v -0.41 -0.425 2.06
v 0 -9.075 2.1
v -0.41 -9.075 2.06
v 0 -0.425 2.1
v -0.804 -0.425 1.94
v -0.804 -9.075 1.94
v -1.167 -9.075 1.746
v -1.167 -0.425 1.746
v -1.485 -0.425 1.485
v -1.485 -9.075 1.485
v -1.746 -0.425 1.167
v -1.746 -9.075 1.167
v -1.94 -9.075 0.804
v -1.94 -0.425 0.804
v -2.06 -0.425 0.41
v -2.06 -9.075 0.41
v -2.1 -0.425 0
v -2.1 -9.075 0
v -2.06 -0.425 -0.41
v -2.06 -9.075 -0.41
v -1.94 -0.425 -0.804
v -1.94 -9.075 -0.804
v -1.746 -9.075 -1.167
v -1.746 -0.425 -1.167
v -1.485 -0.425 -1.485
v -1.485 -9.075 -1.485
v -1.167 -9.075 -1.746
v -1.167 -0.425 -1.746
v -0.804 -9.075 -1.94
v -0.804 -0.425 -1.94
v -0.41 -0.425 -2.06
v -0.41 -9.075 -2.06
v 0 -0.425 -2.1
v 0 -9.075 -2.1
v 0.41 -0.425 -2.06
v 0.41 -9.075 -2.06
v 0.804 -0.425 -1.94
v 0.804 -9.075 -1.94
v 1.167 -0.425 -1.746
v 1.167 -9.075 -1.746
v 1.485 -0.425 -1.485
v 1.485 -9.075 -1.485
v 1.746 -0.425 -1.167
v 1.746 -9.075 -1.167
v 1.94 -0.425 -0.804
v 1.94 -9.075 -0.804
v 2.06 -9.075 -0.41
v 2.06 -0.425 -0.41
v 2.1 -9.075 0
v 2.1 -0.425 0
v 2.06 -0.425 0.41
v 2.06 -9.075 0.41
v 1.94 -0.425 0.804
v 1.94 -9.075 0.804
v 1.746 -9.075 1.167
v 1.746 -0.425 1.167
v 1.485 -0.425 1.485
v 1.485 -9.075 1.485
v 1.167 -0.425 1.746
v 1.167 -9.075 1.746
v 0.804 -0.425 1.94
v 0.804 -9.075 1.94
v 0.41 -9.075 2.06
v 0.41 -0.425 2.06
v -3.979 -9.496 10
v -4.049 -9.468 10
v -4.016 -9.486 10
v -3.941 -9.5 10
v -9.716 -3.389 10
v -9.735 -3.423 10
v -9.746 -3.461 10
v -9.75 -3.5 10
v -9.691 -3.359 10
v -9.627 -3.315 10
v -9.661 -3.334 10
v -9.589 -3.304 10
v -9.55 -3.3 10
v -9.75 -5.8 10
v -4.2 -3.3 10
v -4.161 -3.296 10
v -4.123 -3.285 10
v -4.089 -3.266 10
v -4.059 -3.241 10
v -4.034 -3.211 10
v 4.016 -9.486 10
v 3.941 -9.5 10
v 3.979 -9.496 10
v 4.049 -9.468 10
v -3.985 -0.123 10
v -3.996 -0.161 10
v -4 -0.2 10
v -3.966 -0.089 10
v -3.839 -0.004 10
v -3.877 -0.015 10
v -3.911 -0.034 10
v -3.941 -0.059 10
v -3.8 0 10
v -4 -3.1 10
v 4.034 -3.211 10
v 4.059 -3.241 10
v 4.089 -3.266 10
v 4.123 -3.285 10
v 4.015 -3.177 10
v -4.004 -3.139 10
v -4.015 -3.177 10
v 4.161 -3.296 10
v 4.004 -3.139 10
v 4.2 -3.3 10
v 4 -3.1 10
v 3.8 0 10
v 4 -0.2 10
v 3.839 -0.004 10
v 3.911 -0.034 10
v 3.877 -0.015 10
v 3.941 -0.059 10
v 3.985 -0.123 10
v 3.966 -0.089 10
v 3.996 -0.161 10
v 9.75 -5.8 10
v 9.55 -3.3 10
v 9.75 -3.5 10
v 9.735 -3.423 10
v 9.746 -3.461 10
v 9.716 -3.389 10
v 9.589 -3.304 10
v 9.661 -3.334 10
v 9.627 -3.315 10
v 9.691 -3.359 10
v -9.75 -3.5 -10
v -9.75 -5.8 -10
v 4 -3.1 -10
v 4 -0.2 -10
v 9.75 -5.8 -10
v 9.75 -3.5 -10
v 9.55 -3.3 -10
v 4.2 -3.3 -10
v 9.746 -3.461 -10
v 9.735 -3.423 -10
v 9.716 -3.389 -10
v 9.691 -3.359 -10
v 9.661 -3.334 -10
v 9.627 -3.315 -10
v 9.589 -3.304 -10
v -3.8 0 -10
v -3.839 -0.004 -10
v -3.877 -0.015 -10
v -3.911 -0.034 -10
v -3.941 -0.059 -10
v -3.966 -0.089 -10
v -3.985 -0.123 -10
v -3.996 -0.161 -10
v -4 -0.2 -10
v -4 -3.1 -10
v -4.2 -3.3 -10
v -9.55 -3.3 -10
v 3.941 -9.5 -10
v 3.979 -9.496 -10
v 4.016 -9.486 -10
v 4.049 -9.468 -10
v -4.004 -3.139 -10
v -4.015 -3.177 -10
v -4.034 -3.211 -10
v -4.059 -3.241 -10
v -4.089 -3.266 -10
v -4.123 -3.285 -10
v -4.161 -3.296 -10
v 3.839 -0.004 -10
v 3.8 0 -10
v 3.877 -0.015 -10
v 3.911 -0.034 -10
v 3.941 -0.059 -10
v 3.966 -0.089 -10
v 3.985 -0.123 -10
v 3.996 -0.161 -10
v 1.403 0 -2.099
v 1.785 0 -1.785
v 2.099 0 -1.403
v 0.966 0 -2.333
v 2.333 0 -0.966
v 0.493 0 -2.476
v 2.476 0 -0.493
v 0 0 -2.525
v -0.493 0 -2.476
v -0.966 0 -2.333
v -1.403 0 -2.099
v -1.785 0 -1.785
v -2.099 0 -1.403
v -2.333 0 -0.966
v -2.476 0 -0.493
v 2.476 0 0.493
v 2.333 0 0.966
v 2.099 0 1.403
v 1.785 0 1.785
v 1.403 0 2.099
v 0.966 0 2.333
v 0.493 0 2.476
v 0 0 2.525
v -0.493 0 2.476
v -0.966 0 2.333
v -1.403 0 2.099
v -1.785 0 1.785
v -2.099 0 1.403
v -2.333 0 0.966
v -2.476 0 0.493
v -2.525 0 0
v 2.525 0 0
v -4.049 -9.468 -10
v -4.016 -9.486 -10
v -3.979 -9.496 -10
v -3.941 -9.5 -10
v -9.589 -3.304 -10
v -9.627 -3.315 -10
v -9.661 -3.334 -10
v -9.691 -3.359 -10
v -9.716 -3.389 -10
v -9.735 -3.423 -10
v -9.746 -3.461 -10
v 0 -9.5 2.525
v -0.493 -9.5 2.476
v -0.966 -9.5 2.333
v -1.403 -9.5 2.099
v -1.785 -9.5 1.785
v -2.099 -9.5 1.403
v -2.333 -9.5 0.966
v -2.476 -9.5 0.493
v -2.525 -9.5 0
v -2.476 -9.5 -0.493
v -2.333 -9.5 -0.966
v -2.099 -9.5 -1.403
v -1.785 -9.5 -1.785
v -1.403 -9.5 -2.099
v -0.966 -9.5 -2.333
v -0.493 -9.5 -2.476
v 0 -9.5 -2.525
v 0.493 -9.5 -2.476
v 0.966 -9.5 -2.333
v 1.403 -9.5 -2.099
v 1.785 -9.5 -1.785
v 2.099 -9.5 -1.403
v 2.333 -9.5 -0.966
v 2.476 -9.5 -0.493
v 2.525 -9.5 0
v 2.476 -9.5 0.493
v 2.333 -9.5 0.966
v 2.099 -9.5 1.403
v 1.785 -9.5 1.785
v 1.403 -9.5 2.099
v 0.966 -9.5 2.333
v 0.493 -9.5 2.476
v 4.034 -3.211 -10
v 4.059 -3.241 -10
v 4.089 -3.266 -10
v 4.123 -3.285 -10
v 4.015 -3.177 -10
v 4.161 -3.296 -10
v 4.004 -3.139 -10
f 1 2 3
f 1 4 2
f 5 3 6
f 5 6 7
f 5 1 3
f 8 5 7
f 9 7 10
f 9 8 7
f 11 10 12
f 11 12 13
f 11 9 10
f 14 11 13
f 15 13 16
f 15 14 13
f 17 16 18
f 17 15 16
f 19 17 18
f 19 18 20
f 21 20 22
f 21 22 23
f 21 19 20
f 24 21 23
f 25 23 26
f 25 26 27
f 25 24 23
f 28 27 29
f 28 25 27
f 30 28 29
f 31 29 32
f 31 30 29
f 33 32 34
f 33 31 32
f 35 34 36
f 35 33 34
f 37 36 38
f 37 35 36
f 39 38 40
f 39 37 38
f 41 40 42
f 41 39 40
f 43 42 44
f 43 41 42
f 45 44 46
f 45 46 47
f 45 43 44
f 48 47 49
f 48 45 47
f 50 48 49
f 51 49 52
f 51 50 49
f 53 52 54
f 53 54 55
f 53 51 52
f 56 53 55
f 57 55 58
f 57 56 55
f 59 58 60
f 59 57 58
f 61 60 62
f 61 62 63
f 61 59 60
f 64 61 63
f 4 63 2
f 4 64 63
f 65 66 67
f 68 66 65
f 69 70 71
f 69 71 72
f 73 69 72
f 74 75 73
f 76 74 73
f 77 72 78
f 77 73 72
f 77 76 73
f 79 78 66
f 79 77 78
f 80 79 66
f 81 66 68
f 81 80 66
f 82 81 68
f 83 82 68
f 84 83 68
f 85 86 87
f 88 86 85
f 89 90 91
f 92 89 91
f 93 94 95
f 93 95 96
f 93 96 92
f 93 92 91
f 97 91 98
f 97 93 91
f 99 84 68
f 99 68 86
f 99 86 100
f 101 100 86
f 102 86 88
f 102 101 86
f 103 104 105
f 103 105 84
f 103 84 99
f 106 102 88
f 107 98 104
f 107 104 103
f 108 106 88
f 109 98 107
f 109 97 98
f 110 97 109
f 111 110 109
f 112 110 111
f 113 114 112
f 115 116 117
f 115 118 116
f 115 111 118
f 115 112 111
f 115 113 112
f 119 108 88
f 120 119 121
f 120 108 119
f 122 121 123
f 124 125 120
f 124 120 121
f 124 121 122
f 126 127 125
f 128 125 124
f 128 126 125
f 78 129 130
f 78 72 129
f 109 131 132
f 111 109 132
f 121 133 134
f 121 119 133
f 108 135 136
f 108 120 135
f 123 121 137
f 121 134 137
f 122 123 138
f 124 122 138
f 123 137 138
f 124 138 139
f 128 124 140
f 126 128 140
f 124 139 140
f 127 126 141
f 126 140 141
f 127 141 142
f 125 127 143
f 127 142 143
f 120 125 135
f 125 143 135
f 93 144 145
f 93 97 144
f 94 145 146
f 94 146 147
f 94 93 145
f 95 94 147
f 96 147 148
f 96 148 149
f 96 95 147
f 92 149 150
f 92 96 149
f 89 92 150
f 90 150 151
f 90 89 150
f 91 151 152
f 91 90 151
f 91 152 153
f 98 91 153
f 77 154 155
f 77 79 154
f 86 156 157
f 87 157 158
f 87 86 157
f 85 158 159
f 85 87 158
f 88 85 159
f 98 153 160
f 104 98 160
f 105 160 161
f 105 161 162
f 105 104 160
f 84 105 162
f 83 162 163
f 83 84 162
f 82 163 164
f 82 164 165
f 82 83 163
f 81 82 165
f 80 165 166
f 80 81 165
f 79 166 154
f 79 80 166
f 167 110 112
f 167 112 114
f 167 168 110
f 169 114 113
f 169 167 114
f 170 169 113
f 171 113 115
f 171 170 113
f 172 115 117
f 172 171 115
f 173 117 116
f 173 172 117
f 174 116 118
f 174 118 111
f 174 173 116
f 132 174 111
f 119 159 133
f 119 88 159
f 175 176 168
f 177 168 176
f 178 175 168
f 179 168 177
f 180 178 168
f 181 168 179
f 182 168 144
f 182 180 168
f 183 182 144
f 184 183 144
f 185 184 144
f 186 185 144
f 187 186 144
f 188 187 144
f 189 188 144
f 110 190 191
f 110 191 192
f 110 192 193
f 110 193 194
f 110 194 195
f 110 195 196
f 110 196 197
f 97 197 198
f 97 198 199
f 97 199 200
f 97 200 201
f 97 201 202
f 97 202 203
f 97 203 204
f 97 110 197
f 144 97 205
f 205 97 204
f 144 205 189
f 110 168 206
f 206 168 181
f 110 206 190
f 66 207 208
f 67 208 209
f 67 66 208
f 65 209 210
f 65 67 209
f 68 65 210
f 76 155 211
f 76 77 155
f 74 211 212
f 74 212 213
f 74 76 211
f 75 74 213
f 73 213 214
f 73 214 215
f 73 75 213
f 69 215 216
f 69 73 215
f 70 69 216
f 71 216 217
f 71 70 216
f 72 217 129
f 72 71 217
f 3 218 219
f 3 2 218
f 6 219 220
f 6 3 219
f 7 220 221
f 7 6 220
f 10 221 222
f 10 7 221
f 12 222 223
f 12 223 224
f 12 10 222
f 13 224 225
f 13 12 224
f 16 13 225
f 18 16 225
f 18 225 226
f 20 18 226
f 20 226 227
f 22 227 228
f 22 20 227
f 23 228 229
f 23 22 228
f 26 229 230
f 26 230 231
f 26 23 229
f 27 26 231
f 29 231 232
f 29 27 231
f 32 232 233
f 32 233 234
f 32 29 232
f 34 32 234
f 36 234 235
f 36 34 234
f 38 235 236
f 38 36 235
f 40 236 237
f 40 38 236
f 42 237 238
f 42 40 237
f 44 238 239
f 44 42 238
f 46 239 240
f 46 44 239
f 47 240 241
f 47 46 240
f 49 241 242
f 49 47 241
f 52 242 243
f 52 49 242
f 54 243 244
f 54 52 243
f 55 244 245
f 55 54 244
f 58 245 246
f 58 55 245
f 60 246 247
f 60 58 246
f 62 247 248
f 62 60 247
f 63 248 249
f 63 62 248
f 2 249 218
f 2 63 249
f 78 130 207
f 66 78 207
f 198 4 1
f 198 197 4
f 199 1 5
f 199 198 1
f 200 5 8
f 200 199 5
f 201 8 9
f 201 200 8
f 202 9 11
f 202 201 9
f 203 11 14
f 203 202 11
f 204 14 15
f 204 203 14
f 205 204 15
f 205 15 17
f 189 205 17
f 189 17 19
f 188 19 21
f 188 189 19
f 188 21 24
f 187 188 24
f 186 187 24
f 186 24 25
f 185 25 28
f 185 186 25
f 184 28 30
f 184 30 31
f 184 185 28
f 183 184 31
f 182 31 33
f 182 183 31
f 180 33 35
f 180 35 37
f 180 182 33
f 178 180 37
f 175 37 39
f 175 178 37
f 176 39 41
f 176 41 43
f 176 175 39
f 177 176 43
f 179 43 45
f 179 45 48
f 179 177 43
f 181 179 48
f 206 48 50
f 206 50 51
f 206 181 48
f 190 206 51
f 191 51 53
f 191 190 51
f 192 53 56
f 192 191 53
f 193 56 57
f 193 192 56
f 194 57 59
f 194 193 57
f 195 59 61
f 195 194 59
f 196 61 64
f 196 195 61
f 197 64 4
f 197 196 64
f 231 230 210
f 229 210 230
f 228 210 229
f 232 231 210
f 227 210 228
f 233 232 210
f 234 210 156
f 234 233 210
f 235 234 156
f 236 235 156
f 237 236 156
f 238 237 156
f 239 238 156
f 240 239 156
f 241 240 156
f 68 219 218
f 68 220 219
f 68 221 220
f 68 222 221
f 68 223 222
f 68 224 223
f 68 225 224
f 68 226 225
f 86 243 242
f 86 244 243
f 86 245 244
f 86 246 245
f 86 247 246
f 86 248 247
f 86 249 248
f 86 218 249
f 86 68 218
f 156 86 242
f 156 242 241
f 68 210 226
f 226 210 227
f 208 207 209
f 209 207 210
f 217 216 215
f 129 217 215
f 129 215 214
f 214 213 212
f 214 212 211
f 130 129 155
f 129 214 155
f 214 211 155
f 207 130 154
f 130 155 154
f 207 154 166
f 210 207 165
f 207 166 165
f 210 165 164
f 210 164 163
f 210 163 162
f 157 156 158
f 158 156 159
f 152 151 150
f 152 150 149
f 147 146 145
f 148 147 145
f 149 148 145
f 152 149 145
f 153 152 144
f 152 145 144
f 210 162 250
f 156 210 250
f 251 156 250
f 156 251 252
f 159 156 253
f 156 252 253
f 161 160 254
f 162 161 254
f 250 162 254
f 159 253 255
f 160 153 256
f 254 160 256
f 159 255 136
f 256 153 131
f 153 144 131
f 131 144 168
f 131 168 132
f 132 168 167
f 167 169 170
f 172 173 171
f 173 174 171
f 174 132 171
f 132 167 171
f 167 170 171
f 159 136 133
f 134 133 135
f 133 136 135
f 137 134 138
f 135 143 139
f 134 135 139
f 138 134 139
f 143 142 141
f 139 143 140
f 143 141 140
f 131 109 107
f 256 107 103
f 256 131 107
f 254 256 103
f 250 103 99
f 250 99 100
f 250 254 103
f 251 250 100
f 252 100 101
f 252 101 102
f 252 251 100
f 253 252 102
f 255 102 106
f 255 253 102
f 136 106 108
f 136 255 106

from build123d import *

# Parameters (mm, degrees)
EXTRUDE_1_DEPTH = 10
FILLET_1_R      = 0.2


with BuildPart() as part:
    # Эскиз1 → Бобышка-Вытянуть1 (new body, symmetric)
    with BuildSketch(Plane.XY):
        Polygon((4, 0), (-4, 0), (-4, -3.3), (-9.75, -3.3), (-9.75, -5.8), (-4, -9.5), (4, -9.5), (9.75, -5.8), (9.75, -3.3), (4, -3.3), align=None)
    extrude(amount=EXTRUDE_1_DEPTH, both=True)

    # Эскиз4 → Отверстие обработанное метчиком M53 (revolve, cut)
    with BuildSketch(Plane(origin=(0, 0, 0), x_dir=(0, 0, 1), z_dir=(1, 0, 0))):
        Polygon((0, 0), (0, 9.5), (2.525, 9.5), (2.1, 9.075), (2.1, 0.425), (2.525, 0), align=None)
    revolve(axis=Axis((0, 6.35, 0), (0, -1, 0)), mode=Mode.SUBTRACT)

    # Скругление1
    fillet_1_edges = [part.edges().sort_by_distance(p)[0] for p in [
        (-4, 0, 0),
        (4, 0, 0),
        (4, -3.3, 0),
        (9.75, -3.3, 0),
        (4, -9.5, 0),
        (-4, -9.5, 0),
        (-9.75, -3.3, 0),
        (-4, -3.3, 0),
    ]]
    fillet(fillet_1_edges, radius=FILLET_1_R)


solid = part.part
